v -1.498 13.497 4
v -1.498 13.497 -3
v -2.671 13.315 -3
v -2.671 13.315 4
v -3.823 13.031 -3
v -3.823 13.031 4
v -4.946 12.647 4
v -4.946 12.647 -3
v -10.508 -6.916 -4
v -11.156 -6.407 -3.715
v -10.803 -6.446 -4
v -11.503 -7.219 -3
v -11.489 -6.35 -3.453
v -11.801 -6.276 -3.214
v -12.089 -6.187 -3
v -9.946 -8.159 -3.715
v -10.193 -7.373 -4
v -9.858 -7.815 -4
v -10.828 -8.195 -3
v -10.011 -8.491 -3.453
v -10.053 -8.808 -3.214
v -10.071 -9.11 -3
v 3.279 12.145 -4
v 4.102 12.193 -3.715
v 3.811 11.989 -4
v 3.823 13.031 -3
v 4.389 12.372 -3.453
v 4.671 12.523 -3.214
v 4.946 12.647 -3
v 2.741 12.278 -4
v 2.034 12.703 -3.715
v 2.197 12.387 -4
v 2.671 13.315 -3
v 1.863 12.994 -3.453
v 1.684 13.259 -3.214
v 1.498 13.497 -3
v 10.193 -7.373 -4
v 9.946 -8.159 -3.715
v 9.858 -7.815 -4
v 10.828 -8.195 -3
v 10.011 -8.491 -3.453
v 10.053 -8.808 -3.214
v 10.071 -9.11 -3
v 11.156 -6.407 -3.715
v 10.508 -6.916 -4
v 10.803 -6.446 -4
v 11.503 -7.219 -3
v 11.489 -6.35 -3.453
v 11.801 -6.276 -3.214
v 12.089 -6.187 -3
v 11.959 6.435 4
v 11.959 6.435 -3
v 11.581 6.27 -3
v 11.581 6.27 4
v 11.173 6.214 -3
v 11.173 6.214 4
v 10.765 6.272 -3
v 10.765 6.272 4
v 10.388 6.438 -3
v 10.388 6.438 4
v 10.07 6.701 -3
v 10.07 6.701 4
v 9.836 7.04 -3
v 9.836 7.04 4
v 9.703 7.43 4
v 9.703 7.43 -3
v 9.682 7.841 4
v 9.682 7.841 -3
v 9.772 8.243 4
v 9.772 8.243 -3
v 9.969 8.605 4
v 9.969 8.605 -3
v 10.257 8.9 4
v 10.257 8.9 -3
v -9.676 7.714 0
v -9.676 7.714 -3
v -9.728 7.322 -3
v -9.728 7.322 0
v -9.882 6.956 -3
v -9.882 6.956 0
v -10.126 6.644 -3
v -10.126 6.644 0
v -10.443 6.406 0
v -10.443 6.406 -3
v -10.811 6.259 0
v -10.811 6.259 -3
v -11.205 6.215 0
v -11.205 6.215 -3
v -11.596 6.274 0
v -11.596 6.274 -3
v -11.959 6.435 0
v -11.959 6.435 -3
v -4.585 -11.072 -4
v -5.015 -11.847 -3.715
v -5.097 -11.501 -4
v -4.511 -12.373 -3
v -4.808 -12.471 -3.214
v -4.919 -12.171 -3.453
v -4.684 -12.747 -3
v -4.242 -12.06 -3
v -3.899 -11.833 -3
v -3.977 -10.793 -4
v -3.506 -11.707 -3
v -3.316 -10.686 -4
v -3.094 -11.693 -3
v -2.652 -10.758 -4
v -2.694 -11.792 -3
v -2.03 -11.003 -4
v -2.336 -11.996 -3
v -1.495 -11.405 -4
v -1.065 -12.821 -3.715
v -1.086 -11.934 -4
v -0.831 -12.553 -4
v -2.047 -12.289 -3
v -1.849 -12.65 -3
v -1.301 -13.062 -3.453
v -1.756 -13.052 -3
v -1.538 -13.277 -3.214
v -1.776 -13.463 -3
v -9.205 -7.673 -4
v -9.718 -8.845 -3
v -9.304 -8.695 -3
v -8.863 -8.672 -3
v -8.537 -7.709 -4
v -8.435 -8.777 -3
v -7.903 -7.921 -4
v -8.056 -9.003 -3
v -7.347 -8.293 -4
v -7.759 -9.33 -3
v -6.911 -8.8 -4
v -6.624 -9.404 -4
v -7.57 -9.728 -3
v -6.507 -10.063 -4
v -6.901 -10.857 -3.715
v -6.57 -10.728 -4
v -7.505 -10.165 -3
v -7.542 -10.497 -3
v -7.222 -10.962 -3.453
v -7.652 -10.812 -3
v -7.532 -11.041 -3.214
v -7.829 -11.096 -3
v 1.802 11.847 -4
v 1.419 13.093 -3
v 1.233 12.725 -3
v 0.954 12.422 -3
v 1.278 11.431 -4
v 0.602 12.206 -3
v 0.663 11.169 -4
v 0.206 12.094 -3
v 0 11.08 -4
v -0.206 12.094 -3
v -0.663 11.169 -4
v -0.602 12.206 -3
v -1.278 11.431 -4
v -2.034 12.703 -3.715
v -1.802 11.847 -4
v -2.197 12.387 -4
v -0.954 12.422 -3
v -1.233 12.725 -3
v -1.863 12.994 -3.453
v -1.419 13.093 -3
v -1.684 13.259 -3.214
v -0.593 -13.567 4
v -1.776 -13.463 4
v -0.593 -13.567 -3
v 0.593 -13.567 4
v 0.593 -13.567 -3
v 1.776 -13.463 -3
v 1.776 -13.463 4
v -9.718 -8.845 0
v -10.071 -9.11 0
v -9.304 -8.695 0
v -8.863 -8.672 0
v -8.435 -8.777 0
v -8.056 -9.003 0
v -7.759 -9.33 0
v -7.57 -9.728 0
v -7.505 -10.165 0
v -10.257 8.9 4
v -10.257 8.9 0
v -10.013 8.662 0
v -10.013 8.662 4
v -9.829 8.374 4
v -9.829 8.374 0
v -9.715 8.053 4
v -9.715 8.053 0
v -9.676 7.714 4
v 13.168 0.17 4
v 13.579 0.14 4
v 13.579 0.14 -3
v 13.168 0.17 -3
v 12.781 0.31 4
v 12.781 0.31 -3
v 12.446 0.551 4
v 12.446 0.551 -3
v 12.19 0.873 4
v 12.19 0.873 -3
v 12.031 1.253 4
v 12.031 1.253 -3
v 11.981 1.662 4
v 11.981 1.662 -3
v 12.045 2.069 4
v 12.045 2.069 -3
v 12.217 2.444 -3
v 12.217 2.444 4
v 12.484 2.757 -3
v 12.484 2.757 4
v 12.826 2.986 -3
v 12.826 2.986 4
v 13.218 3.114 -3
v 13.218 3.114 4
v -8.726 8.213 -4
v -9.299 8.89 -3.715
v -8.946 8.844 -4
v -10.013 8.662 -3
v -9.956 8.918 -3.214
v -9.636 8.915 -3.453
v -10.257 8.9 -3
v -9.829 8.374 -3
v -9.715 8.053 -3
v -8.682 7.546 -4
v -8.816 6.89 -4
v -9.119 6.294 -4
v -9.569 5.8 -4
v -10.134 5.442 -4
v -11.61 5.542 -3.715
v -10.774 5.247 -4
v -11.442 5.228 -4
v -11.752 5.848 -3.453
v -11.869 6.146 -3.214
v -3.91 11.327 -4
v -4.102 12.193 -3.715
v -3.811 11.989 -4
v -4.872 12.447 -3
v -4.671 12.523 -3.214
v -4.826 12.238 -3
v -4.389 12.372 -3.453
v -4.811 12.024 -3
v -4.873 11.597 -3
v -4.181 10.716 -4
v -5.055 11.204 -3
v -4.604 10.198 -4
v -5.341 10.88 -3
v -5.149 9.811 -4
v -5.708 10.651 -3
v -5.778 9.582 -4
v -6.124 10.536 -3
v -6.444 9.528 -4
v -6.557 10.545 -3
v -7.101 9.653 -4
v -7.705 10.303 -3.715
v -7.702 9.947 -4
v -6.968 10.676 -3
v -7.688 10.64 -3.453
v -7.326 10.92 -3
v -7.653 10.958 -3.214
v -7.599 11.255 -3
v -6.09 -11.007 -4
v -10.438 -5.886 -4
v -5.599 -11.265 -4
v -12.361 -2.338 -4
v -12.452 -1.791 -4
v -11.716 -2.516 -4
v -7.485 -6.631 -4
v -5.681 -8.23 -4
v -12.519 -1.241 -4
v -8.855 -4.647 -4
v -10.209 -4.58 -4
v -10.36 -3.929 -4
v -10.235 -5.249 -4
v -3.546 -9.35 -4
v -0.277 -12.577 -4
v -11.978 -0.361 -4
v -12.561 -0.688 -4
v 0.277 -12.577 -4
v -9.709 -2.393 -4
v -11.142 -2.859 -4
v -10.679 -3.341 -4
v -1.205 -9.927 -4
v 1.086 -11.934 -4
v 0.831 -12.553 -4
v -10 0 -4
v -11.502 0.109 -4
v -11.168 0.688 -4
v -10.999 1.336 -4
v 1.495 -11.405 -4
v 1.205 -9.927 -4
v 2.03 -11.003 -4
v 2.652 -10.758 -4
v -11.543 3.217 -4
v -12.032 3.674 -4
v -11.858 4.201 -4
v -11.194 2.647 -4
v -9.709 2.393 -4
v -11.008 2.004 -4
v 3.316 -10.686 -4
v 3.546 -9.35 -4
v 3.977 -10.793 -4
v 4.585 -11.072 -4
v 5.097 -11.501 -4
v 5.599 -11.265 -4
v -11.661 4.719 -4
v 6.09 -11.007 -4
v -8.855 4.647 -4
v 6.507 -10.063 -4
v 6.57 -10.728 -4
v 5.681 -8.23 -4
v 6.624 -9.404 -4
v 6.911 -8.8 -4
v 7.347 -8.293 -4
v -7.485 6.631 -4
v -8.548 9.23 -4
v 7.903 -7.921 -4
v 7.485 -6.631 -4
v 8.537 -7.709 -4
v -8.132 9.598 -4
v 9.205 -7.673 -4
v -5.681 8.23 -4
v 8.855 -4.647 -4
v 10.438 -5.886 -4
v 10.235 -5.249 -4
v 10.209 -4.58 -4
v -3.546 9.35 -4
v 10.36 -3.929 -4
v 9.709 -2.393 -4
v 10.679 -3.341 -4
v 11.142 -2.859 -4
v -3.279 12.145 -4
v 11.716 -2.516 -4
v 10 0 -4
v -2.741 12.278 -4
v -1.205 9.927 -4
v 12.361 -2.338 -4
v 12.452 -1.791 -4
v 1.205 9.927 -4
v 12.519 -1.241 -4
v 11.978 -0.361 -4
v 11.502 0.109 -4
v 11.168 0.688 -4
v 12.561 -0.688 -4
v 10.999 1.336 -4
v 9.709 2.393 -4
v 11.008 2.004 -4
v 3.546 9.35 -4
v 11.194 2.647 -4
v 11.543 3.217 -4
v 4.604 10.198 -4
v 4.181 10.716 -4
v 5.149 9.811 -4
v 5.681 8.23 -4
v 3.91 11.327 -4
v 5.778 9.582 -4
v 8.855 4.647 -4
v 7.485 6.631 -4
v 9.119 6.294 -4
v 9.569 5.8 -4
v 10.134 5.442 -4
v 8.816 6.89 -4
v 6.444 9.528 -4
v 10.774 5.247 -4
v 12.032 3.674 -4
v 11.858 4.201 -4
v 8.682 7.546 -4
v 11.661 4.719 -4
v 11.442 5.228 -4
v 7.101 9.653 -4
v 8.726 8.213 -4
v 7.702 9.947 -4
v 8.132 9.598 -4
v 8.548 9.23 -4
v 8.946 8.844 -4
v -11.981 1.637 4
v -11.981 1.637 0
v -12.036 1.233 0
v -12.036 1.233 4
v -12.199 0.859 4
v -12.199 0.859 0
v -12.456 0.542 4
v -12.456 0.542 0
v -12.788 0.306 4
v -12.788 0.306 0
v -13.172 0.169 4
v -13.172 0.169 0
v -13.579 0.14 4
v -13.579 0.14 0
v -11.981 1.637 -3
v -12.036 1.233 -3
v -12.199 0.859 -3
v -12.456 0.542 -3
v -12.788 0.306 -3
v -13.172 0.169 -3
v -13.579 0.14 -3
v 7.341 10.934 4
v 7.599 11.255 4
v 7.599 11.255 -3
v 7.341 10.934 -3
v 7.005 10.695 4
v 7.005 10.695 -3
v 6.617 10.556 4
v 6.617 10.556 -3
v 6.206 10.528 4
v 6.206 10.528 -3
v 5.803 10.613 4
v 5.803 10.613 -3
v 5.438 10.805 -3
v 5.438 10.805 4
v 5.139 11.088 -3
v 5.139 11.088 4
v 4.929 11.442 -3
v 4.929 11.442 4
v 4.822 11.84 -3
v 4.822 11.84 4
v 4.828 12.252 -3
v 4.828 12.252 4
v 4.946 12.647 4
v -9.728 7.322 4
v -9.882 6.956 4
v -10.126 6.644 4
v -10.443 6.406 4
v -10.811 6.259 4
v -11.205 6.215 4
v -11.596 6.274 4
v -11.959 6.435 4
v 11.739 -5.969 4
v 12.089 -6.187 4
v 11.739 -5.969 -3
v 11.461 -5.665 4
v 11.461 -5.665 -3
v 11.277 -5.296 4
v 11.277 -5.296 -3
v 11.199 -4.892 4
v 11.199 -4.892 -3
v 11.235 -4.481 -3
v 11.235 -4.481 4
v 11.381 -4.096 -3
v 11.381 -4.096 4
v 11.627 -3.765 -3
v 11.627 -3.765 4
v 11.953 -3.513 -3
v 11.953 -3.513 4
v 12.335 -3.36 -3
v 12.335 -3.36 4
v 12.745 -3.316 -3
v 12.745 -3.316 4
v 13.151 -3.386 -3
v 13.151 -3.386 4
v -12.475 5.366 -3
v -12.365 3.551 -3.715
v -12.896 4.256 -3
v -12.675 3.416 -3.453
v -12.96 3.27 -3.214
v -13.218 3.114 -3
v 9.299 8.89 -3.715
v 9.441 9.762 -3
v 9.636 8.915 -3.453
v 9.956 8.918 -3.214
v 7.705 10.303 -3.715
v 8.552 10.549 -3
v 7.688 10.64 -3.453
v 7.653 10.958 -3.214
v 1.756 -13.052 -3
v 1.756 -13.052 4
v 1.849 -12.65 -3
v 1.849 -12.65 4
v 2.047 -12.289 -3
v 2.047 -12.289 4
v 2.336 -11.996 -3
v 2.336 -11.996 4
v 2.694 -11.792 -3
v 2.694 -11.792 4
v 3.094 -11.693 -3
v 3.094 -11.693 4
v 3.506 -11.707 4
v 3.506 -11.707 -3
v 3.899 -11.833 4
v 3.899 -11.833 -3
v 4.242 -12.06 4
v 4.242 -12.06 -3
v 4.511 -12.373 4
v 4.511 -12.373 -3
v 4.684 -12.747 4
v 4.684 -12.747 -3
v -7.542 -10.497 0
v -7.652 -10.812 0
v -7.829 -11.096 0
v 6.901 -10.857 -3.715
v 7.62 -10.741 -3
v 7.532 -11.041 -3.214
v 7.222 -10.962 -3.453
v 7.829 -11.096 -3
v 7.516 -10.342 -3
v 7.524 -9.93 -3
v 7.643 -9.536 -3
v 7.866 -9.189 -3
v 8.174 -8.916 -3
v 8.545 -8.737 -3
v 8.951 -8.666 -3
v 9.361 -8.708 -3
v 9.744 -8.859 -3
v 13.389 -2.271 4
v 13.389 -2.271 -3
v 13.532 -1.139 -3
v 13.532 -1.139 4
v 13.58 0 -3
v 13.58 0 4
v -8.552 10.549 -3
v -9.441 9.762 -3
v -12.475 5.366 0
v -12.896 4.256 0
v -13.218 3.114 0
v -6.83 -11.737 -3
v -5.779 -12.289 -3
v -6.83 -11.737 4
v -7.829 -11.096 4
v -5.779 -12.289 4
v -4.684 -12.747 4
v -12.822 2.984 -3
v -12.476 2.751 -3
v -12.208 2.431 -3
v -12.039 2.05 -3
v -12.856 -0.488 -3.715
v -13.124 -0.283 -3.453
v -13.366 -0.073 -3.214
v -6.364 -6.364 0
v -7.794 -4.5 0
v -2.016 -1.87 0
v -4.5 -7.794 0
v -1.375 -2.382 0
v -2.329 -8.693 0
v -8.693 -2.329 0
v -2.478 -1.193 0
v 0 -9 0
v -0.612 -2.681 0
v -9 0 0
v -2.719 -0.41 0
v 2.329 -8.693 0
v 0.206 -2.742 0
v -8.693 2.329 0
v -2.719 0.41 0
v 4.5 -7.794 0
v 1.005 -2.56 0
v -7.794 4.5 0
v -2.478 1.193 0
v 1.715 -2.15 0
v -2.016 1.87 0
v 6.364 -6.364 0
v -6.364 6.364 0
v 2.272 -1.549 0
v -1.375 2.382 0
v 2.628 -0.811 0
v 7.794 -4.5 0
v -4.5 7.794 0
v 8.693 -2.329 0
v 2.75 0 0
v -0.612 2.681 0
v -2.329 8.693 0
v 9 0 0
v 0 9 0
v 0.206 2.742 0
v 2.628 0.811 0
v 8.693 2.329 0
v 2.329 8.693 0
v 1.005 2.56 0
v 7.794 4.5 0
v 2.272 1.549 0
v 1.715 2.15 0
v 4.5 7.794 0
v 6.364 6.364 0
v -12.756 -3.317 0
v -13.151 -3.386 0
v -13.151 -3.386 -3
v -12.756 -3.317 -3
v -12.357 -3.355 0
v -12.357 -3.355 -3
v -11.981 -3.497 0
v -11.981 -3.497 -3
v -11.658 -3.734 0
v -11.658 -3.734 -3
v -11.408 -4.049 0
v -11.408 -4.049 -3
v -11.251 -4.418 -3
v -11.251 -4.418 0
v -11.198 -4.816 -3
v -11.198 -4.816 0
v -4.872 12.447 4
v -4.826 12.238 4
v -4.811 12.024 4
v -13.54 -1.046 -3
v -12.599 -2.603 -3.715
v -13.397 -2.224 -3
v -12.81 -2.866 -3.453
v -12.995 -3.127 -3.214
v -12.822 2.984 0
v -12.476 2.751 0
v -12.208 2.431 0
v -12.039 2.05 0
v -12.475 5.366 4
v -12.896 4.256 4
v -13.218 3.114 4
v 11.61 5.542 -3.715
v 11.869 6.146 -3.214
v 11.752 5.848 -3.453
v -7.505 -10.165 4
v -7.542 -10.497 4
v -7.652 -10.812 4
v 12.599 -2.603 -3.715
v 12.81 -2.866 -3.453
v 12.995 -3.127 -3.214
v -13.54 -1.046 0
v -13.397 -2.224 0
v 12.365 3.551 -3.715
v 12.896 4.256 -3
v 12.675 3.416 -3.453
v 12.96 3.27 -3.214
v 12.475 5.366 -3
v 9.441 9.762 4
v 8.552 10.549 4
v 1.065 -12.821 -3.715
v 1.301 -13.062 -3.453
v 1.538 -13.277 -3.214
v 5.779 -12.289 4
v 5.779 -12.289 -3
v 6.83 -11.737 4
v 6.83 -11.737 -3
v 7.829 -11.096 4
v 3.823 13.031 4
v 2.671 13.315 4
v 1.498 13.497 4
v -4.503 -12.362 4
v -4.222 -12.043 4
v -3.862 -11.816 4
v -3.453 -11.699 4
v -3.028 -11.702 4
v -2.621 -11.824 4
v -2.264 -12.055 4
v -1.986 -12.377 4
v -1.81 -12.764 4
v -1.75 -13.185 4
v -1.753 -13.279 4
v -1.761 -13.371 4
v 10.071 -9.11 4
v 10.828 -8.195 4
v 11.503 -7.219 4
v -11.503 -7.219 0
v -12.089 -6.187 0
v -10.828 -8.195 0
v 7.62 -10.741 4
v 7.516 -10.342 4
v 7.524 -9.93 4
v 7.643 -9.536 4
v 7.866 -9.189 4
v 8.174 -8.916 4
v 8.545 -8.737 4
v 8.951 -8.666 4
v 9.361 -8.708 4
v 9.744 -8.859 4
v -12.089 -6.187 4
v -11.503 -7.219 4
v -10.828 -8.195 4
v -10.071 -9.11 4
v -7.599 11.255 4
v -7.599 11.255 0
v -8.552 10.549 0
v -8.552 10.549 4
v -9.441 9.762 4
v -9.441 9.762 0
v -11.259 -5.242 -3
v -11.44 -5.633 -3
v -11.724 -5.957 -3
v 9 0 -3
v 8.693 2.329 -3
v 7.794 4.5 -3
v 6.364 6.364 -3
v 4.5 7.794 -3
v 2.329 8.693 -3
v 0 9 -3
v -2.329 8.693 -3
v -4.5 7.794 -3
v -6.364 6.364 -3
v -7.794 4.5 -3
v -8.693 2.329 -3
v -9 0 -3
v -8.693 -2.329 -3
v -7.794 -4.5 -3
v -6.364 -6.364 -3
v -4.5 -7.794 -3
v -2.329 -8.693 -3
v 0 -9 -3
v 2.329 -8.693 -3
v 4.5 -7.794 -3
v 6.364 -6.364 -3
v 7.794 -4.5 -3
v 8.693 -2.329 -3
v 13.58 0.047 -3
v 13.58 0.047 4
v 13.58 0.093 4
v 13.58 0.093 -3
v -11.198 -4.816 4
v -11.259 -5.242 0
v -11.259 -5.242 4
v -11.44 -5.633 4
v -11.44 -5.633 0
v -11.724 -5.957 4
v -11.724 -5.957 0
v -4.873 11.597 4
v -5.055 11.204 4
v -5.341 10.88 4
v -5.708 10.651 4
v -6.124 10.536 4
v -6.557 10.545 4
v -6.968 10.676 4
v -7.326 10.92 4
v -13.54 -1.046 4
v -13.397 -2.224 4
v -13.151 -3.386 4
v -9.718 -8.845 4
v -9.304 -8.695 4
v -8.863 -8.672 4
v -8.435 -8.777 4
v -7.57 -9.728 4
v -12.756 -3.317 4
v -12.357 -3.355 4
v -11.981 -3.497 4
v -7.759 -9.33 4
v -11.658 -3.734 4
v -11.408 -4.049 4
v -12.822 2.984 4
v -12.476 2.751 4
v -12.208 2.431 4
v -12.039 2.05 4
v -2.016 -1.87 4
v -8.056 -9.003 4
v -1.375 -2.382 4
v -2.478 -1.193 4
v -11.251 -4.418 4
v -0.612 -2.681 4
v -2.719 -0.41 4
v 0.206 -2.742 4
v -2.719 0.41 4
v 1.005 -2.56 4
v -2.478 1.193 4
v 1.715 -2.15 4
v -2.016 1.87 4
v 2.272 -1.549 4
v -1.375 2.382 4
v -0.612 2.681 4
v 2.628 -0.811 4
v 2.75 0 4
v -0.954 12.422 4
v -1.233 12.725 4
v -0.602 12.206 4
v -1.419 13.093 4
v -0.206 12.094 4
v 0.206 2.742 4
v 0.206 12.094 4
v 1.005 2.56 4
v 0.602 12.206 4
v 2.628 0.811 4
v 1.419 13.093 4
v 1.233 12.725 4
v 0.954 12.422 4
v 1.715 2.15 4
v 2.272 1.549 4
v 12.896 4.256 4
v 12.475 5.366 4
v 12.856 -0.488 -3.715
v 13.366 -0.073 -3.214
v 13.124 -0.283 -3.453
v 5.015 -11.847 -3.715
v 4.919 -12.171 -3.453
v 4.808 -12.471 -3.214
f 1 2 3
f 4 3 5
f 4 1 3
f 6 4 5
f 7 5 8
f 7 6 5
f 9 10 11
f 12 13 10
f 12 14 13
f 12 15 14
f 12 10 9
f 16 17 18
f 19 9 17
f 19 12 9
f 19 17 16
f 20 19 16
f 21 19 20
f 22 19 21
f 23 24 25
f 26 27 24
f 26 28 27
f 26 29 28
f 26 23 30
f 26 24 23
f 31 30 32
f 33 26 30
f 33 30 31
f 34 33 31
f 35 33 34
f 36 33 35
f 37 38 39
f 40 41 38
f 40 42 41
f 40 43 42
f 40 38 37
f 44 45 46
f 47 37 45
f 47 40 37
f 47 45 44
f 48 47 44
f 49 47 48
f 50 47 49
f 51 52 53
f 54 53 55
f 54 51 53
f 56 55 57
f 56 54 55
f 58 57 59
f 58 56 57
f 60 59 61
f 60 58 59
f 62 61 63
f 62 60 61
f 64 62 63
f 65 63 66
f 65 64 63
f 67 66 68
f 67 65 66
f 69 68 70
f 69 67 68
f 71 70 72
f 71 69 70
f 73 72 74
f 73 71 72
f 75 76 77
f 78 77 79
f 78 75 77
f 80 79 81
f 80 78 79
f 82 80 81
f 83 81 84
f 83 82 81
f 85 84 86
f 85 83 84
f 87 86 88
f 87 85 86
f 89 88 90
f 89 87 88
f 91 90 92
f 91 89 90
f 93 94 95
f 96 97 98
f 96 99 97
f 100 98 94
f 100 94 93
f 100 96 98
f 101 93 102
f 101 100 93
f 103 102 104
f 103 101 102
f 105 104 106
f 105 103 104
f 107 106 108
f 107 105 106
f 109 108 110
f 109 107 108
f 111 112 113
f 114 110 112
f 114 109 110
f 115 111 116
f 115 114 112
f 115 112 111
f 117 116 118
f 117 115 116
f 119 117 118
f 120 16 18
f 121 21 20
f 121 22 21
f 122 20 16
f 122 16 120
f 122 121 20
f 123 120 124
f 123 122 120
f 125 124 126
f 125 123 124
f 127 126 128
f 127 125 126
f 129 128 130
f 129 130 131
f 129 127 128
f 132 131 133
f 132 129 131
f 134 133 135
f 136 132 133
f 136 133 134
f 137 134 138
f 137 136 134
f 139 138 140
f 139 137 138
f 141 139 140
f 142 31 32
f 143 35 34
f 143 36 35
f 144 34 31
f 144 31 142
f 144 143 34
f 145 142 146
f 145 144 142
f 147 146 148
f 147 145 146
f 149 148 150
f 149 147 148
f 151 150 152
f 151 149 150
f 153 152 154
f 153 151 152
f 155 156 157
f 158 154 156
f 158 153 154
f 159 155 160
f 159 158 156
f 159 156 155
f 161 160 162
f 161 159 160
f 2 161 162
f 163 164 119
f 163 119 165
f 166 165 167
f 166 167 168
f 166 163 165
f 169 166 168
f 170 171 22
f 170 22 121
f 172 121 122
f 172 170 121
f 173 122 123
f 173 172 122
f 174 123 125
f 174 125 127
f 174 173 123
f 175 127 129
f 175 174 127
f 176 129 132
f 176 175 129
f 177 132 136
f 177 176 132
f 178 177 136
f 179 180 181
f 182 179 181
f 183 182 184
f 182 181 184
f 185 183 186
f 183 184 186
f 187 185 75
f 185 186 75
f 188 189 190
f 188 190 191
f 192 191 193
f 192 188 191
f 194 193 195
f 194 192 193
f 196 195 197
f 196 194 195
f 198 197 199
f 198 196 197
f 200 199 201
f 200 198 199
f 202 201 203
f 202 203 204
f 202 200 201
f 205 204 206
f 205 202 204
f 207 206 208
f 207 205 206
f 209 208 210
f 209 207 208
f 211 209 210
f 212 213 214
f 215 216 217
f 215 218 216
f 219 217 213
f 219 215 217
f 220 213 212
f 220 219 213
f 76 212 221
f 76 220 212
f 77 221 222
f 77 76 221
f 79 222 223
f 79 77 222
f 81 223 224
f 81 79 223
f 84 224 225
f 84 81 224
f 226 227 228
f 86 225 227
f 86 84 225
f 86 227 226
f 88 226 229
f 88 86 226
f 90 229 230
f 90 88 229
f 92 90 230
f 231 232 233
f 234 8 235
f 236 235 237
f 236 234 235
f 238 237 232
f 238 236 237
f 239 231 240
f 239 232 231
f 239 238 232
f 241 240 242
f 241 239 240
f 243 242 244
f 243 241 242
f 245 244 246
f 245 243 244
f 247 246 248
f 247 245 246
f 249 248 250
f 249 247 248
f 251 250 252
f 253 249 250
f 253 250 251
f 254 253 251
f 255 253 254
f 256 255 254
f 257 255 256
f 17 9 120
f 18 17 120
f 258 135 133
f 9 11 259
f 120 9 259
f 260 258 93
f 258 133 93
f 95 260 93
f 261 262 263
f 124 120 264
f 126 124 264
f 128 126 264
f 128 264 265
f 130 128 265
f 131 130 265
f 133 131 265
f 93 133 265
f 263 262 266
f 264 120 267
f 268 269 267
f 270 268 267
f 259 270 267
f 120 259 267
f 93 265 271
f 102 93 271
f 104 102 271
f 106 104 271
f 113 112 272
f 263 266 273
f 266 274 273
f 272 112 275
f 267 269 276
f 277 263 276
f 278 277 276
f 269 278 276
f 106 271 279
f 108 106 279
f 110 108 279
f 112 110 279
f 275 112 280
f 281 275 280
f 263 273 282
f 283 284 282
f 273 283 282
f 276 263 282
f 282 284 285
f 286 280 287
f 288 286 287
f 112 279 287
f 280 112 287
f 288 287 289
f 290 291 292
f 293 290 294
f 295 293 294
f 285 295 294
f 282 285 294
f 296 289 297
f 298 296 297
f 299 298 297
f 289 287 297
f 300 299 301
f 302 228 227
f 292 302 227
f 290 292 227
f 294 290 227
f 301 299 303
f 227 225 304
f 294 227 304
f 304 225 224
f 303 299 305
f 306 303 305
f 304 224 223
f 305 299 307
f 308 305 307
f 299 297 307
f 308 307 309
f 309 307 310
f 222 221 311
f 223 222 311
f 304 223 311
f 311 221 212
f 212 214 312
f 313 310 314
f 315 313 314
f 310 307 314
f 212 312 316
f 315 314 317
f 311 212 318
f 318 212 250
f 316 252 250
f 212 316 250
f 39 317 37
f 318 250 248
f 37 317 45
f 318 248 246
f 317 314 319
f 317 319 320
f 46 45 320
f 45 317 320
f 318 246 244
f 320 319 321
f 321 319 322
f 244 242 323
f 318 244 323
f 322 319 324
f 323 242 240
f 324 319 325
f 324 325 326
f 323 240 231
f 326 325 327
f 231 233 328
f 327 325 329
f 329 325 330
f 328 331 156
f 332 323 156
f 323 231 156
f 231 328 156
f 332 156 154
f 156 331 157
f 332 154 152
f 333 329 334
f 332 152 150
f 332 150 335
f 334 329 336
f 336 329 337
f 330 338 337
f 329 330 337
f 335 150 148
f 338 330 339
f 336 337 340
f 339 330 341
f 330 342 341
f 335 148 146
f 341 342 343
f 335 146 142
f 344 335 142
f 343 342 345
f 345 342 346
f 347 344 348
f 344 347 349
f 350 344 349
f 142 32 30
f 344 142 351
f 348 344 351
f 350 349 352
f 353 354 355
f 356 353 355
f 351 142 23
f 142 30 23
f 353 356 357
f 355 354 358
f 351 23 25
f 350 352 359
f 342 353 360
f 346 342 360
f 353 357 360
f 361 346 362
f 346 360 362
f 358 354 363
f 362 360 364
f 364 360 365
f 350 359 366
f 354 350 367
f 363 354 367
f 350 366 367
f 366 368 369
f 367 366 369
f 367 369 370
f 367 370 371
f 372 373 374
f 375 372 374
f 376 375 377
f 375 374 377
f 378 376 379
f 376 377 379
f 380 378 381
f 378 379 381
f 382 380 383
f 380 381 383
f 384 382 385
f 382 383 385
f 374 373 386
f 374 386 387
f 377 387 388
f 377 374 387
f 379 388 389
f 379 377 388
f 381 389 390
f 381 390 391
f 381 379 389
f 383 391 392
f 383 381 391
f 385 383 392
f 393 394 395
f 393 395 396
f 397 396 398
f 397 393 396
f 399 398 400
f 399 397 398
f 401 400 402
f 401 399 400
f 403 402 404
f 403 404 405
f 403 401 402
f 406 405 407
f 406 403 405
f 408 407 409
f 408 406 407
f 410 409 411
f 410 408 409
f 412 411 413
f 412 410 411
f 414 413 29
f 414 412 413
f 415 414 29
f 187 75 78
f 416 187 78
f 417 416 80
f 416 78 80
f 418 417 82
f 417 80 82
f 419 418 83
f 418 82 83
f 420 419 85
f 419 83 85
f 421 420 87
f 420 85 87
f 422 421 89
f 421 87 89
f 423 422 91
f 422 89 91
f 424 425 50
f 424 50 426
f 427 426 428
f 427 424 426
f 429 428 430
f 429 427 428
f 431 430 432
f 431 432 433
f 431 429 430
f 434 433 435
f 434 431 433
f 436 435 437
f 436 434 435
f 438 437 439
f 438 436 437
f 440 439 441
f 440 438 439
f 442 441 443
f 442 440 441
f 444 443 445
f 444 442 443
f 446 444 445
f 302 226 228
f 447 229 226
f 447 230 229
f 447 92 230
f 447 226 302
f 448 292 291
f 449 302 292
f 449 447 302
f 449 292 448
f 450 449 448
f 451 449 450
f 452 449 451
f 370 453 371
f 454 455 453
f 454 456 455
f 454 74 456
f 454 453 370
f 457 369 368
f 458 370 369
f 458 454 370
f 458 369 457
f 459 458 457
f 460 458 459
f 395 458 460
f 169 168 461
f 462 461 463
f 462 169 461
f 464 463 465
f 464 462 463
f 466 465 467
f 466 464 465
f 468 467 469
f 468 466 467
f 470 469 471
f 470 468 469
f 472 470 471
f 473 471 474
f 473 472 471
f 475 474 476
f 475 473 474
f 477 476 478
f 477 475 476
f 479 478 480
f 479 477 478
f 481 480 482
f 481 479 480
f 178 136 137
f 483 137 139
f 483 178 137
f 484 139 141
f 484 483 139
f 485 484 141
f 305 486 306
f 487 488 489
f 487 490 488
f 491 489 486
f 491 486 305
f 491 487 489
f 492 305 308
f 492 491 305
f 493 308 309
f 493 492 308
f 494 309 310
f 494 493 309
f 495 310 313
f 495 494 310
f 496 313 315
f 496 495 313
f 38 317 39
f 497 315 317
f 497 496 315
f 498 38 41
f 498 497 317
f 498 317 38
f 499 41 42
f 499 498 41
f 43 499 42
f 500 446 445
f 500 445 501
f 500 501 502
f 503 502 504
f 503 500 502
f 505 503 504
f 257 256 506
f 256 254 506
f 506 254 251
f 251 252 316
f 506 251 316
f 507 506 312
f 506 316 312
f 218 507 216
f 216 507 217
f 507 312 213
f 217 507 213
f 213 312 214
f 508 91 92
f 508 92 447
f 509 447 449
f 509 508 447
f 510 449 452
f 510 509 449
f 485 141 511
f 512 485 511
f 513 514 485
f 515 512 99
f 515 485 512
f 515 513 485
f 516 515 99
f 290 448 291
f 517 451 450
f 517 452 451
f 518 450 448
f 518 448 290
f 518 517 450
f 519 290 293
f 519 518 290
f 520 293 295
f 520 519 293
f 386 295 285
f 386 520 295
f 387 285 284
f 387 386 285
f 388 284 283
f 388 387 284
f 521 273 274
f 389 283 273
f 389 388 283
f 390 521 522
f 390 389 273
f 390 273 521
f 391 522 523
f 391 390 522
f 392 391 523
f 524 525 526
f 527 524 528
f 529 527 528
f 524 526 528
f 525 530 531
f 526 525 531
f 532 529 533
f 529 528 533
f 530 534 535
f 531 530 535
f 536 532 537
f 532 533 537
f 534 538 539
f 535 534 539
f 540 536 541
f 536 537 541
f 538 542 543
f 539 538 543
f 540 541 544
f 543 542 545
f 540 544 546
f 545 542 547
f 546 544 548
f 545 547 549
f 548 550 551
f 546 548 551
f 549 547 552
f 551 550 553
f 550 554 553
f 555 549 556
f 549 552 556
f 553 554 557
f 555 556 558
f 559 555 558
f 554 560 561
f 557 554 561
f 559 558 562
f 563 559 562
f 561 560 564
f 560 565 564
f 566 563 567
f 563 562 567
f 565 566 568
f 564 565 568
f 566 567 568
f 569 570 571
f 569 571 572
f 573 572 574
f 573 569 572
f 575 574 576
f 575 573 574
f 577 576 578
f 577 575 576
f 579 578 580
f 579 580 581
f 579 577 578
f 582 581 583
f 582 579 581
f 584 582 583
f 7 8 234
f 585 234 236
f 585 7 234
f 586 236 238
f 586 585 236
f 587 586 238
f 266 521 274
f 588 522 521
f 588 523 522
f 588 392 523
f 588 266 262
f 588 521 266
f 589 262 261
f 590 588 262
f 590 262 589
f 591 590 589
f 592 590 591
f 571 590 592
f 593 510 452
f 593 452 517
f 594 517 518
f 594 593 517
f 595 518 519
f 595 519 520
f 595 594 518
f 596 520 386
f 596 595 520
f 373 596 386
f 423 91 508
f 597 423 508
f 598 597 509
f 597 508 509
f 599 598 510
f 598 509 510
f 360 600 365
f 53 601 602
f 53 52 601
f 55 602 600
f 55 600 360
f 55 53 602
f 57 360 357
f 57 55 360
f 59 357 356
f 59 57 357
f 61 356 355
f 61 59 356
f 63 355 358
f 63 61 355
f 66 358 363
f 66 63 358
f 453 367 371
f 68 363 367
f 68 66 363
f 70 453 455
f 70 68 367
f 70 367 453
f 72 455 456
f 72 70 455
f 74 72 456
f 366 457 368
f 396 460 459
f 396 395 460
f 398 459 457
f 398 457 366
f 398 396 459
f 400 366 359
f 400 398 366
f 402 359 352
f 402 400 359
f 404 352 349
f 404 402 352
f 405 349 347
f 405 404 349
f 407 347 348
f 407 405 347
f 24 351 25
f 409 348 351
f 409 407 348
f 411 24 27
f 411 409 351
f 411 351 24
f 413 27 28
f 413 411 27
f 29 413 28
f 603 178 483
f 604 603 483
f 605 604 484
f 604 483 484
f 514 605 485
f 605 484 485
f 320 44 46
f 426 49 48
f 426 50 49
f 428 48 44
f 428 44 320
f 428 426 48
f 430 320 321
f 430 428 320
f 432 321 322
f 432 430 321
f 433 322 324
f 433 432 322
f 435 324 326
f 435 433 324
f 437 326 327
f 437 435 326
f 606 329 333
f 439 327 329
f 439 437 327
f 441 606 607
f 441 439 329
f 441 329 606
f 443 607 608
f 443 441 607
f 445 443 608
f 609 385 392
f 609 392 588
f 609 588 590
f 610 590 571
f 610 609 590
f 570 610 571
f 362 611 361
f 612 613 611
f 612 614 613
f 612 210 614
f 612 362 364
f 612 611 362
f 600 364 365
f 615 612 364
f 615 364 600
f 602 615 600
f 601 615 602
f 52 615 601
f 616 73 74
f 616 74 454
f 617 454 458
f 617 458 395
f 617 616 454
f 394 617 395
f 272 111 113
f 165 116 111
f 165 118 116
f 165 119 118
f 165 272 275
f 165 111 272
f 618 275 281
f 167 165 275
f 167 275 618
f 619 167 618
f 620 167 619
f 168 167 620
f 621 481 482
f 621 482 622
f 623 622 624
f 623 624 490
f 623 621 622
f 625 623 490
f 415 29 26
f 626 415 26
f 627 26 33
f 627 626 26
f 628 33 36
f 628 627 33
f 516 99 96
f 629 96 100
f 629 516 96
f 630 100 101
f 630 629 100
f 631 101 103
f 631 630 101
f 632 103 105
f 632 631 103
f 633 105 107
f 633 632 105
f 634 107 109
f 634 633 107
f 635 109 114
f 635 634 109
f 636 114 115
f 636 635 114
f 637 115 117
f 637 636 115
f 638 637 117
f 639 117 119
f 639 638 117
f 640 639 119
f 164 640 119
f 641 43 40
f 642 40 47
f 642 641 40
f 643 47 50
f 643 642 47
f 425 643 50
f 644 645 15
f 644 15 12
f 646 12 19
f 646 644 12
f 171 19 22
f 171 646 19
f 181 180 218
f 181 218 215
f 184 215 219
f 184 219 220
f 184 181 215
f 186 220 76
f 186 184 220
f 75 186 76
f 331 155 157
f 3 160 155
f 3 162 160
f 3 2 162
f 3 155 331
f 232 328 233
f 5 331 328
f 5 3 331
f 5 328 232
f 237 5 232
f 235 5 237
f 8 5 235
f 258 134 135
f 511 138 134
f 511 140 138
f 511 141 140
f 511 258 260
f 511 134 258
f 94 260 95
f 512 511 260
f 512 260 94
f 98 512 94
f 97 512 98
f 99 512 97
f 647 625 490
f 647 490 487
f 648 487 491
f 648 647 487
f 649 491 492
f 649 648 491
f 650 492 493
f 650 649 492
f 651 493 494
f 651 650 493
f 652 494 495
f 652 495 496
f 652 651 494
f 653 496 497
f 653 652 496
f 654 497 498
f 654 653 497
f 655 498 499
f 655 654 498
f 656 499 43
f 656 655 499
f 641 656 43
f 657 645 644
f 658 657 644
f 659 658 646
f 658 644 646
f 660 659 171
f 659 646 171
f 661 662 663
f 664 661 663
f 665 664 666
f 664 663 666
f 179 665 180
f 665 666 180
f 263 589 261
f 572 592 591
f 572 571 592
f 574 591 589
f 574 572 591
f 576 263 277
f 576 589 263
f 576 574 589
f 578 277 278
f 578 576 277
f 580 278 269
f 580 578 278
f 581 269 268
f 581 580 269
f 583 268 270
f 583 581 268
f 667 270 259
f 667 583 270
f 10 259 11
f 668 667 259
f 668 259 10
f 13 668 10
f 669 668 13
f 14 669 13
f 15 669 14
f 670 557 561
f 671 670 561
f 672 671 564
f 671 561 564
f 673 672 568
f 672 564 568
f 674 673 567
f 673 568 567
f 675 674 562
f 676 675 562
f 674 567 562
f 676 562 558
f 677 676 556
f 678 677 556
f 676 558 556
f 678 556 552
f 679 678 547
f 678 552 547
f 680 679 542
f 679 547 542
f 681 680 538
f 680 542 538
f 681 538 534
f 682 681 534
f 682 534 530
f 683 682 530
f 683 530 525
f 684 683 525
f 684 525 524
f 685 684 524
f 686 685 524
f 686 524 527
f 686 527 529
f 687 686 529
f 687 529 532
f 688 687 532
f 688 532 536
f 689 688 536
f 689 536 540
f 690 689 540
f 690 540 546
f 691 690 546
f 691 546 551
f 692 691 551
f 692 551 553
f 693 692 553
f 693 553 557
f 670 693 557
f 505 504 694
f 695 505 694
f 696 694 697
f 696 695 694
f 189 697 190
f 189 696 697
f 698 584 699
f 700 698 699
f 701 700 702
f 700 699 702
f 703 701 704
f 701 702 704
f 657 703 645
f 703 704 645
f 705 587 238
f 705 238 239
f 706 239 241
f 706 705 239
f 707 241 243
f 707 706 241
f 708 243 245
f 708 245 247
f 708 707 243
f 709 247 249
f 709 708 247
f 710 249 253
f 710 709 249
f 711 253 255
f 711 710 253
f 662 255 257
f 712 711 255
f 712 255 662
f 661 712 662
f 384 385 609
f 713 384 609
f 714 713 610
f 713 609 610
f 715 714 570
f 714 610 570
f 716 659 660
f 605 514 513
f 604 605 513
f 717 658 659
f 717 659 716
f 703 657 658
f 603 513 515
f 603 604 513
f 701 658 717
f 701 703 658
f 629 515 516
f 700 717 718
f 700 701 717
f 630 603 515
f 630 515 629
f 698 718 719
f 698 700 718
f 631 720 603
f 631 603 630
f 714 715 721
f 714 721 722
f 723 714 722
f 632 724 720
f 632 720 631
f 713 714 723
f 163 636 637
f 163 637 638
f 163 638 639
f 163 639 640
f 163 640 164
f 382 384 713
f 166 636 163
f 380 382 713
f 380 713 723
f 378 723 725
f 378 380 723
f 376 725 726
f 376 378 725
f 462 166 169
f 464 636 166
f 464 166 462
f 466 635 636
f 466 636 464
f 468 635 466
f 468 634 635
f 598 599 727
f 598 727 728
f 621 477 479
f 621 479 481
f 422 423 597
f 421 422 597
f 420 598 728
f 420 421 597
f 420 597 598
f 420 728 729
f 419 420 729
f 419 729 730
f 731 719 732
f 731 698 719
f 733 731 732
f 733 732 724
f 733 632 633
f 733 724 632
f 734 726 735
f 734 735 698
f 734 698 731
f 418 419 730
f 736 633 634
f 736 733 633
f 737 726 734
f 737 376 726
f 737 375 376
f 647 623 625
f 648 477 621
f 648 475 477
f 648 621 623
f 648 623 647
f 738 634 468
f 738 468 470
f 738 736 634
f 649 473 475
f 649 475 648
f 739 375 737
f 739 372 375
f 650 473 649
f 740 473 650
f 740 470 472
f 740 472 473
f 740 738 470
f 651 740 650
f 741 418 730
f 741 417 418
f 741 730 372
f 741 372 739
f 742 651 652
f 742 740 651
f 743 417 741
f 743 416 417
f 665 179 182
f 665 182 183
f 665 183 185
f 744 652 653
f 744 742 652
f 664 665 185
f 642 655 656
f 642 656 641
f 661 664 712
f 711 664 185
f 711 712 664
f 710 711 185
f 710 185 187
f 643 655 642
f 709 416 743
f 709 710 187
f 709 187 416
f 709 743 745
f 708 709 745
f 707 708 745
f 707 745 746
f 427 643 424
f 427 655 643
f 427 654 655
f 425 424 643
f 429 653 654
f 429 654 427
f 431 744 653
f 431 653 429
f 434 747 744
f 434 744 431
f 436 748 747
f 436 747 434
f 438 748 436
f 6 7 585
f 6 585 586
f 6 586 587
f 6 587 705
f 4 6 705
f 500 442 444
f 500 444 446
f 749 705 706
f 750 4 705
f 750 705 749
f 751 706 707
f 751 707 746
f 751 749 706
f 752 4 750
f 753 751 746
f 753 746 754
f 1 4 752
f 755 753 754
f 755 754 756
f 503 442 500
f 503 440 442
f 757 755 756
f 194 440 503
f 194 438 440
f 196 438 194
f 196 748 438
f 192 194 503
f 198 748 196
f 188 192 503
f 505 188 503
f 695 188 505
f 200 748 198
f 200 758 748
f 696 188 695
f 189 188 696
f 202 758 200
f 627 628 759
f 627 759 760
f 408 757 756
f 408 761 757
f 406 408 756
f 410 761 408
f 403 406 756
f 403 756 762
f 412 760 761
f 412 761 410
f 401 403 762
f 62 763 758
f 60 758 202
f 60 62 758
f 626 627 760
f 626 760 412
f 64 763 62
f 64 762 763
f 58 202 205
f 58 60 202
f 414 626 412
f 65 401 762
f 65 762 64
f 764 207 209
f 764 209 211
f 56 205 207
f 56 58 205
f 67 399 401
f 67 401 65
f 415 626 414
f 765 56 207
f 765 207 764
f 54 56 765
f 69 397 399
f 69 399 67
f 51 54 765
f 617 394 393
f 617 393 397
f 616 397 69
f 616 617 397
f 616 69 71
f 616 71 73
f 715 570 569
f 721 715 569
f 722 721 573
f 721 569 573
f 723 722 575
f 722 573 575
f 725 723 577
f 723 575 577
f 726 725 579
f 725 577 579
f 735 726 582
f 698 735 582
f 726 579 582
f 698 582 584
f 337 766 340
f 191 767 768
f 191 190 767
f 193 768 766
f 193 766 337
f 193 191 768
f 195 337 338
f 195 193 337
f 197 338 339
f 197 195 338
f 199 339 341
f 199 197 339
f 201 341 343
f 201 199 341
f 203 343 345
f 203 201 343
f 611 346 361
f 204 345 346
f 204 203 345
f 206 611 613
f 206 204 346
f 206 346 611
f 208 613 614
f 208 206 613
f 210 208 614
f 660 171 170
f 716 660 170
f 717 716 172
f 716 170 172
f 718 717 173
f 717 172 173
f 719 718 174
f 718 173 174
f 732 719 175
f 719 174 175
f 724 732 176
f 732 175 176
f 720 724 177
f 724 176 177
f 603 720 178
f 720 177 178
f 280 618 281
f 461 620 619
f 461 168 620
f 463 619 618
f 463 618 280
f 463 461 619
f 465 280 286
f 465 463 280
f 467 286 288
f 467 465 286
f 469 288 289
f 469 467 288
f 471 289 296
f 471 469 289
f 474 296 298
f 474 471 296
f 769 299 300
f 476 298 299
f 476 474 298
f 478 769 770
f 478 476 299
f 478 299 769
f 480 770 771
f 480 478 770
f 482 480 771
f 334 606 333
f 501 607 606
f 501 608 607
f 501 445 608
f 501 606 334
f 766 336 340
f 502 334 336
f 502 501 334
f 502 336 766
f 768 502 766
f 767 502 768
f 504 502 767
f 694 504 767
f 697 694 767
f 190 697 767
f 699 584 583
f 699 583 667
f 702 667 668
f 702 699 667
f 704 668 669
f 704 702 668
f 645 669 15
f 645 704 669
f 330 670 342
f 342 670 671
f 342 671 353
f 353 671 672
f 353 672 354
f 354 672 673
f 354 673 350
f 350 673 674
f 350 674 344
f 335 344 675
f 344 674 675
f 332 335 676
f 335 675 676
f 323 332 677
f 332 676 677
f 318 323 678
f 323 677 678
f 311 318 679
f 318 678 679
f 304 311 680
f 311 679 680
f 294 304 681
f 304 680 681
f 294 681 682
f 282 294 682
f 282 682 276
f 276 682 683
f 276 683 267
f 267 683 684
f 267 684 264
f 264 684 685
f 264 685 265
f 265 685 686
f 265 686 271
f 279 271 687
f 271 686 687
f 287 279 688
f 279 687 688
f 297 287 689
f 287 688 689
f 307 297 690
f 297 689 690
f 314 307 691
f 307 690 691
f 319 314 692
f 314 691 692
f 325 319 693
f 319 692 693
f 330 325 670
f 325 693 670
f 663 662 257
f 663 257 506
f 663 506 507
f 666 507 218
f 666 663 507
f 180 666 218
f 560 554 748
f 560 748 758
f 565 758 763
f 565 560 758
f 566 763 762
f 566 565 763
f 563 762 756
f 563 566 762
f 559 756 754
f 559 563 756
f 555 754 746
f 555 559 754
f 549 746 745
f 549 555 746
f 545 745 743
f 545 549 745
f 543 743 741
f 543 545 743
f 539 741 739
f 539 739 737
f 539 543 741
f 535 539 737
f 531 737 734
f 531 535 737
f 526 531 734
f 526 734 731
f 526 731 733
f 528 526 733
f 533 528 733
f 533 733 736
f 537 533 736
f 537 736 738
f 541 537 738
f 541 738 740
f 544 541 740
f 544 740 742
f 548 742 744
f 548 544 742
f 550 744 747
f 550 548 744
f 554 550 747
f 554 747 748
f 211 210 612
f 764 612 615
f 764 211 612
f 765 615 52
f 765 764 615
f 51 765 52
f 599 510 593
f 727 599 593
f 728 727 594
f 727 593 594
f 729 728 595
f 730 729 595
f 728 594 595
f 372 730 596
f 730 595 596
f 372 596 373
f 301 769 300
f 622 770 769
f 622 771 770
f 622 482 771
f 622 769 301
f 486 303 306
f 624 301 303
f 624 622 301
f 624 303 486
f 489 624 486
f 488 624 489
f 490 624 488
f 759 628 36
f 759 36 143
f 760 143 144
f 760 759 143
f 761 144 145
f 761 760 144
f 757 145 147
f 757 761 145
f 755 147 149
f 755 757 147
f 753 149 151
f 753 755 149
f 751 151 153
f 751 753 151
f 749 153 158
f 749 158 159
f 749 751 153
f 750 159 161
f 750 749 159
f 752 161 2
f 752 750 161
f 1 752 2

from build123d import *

# Parameters (mm, degrees)
F0_R         = 9
F0_R_2       = 2.75
F1_DEPTH     = 4
F2_DEPTH     = 4
F3_T2_ANGLE  = 36.7292460902
F3_T4_ANGLE  = 359.64
F3_T6_ANGLE  = 36.7292460902
F3_T8_ANGLE  = 359.64
F3_T10_ANGLE = 36.7292460902
F3_T12_ANGLE = 359.64
F3_T14_ANGLE = 36.7292460902
F3_T16_ANGLE = 359.64
F3_T18_ANGLE = 36.7292460902
F3_T20_ANGLE = 359.64
F3_T22_ANGLE = 36.7292460902
F3_T24_ANGLE = 359.64
F3_T26_ANGLE = 36.7292460902
F3_T28_ANGLE = 359.64
F3_T30_ANGLE = 36.7292460902
F3_T32_ANGLE = 359.64
F3_T34_ANGLE = 36.7292460902
F3_T36_ANGLE = 359.64
F3_T38_ANGLE = 36.7292460902
F3_T40_ANGLE = 359.64
F3_T42_ANGLE = 36.7292460902
F3_T44_ANGLE = 359.64
F3_T46_ANGLE = 36.7292460902
F3_T48_ANGLE = 359.64
F3_T50_ANGLE = 36.7292460902
F3_T52_ANGLE = 359.64


# Not quite as in the source:
# - a fillet or chamfer that OpenCascade refuses, or shapes differently, is made with other operations: its cross-section is extruded or revolved along the edge and cut away or added


with BuildPart() as f1:
    # F0 (on Top) → F1 (new body)
    with BuildSketch(Plane.XY):
        with BuildLine():
            ThreePointArc((13.1511570809, -3.3857742739), (13.4723626948, -1.7064124416), (13.58, 0))
            ThreePointArc((13.58, 0), (13.579819293, 0.0700568992), (13.5792771769, 0.1401119339))
            ThreePointArc((13.5792771769, 0.1401119339), (11.9919231991, 1.4560830975), (13.218219042, 3.1136932024))
            ThreePointArc((13.218219042, 3.1136932024), (12.6975205757, 4.815534366), (11.9587395379, 6.4346677198))
            ThreePointArc((11.9587395379, 6.4346677198), (9.9416451, 6.8622221405), (10.2571463173, 8.89985109))
            ThreePointArc((10.2571463173, 8.89985109), (9.0052056989, 10.1647759602), (7.5985987892, 11.2551186773))
            ThreePointArc((7.5985987892, 11.2551186773), (5.6138559183, 10.6963087899), (4.9462849834, 12.6471603478))
            ThreePointArc((4.9462849834, 12.6471603478), (3.249906721, 13.1853898806), (1.497710631, 13.4971575847))
            ThreePointArc((1.497710631, 13.4971575847), (0, 12.08), (-1.497710631, 13.4971575847))
            ThreePointArc((-1.497710631, 13.4971575847), (-3.249906721, 13.1853898806), (-4.9462849834, 12.6471603478))
            ThreePointArc((-4.9462849834, 12.6471603478), (-4.845167239, 12.3430963913), (-4.8109406764, 12.0244928284))
            ThreePointArc((-4.8109406764, 12.0244928284), (-5.9118712396, 10.5785524476), (-7.5985987892, 11.2551186773))
            ThreePointArc((-7.5985987892, 11.2551186773), (-9.0052056989, 10.1647759602), (-10.2571463173, 8.89985109))
            ThreePointArc((-10.2571463173, 8.89985109), (-9.8291869969, 8.3744473269), (-9.6761208988, 7.7143192606))
            ThreePointArc((-9.6761208988, 7.7143192606), (-10.4426115119, 6.4058988468), (-11.9587395379, 6.4346677198))
            ThreePointArc((-11.9587395379, 6.4346677198), (-12.6975205757, 4.815534366), (-13.218219042, 3.1136932024))
            ThreePointArc((-13.218219042, 3.1136932024), (-12.3311710463, 2.6001764438), (-11.9809865103, 1.6368881179))
            ThreePointArc((-11.9809865103, 1.6368881179), (-12.4556660725, 0.5420283095), (-13.5792771769, 0.1401119339))
            ThreePointArc((-13.5792771769, 0.1401119339), (-13.4809865103, -1.6368881179), (-13.1511570809, -3.3857742739))
            ThreePointArc((-13.1511570809, -3.3857742739), (-11.811646645, -3.6050685966), (-11.1975205757, -4.815534366))
            ThreePointArc((-11.1975205757, -4.815534366), (-11.4399769841, -5.6332042965), (-12.0889660626, -6.1865418075))
            ThreePointArc((-12.0889660626, -6.1865418075), (-11.1761208988, -7.7143192606), (-10.0713235212, -9.109601667))
            ThreePointArc((-10.0713235212, -9.109601667), (-8.4347570743, -8.7774806179), (-7.5052056989, -10.1647759602))
            ThreePointArc((-7.5052056989, -10.1647759602), (-7.588522816, -10.6577360085), (-7.8292185113, -11.0959333768))
            ThreePointArc((-7.8292185113, -11.0959333768), (-6.3109406764, -12.0244928284), (-4.6842711154, -12.7465291008))
            ThreePointArc((-4.6842711154, -12.7465291008), (-3.0280358031, -11.7018895282), (-1.749906721, -13.1853898806))
            ThreePointArc((-1.749906721, -13.1853898806), (-1.7564170065, -13.3249910007), (-1.7758913513, -13.4633803299))
            ThreePointArc((-1.7758913513, -13.4633803299), (0, -13.58), (1.7758913513, -13.4633803299))
            ThreePointArc((1.7758913513, -13.4633803299), (2.8909332246, -11.7289771545), (4.6842711154, -12.7465291008))
            ThreePointArc((4.6842711154, -12.7465291008), (6.3109406764, -12.0244928284), (7.8292185113, -11.0959333768))
            ThreePointArc((7.8292185113, -11.0959333768), (8.0105217115, -9.0420098379), (10.0713235212, -9.109601667))
            ThreePointArc((10.0713235212, -9.109601667), (11.1761208988, -7.7143192606), (12.0889660626, -6.1865418075))
            ThreePointArc((12.0889660626, -6.1865418075), (11.2949962116, -4.2836270355), (13.1511570809, -3.3857742739))
        make_face()
        Circle(F0_R, mode=Mode.SUBTRACT)
        Circle(F0_R)
        Circle(F0_R_2, mode=Mode.SUBTRACT)
    extrude(amount=F1_DEPTH)

    # F0 (on Top) → F2 (join)
    with BuildSketch(Plane.XY):
        with BuildLine():
            ThreePointArc((13.1511570809, -3.3857742739), (13.4723626948, -1.7064124416), (13.58, 0))
            ThreePointArc((13.58, 0), (13.579819293, 0.0700568992), (13.5792771769, 0.1401119339))
            ThreePointArc((13.5792771769, 0.1401119339), (11.9919231991, 1.4560830975), (13.218219042, 3.1136932024))
            ThreePointArc((13.218219042, 3.1136932024), (12.6975205757, 4.815534366), (11.9587395379, 6.4346677198))
            ThreePointArc((11.9587395379, 6.4346677198), (9.9416451, 6.8622221405), (10.2571463173, 8.89985109))
            ThreePointArc((10.2571463173, 8.89985109), (9.0052056989, 10.1647759602), (7.5985987892, 11.2551186773))
            ThreePointArc((7.5985987892, 11.2551186773), (5.6138559183, 10.6963087899), (4.9462849834, 12.6471603478))
            ThreePointArc((4.9462849834, 12.6471603478), (3.249906721, 13.1853898806), (1.497710631, 13.4971575847))
            ThreePointArc((1.497710631, 13.4971575847), (0, 12.08), (-1.497710631, 13.4971575847))
            ThreePointArc((-1.497710631, 13.4971575847), (-3.249906721, 13.1853898806), (-4.9462849834, 12.6471603478))
            ThreePointArc((-4.9462849834, 12.6471603478), (-4.845167239, 12.3430963913), (-4.8109406764, 12.0244928284))
            ThreePointArc((-4.8109406764, 12.0244928284), (-5.9118712396, 10.5785524476), (-7.5985987892, 11.2551186773))
            ThreePointArc((-7.5985987892, 11.2551186773), (-9.0052056989, 10.1647759602), (-10.2571463173, 8.89985109))
            ThreePointArc((-10.2571463173, 8.89985109), (-9.8291869969, 8.3744473269), (-9.6761208988, 7.7143192606))
            ThreePointArc((-9.6761208988, 7.7143192606), (-10.4426115119, 6.4058988468), (-11.9587395379, 6.4346677198))
            ThreePointArc((-11.9587395379, 6.4346677198), (-12.6975205757, 4.815534366), (-13.218219042, 3.1136932024))
            ThreePointArc((-13.218219042, 3.1136932024), (-12.3311710463, 2.6001764438), (-11.9809865103, 1.6368881179))
            ThreePointArc((-11.9809865103, 1.6368881179), (-12.4556660725, 0.5420283095), (-13.5792771769, 0.1401119339))
            ThreePointArc((-13.5792771769, 0.1401119339), (-13.4809865103, -1.6368881179), (-13.1511570809, -3.3857742739))
            ThreePointArc((-13.1511570809, -3.3857742739), (-11.811646645, -3.6050685966), (-11.1975205757, -4.815534366))
            ThreePointArc((-11.1975205757, -4.815534366), (-11.4399769841, -5.6332042965), (-12.0889660626, -6.1865418075))
            ThreePointArc((-12.0889660626, -6.1865418075), (-11.1761208988, -7.7143192606), (-10.0713235212, -9.109601667))
            ThreePointArc((-10.0713235212, -9.109601667), (-8.4347570743, -8.7774806179), (-7.5052056989, -10.1647759602))
            ThreePointArc((-7.5052056989, -10.1647759602), (-7.588522816, -10.6577360085), (-7.8292185113, -11.0959333768))
            ThreePointArc((-7.8292185113, -11.0959333768), (-6.3109406764, -12.0244928284), (-4.6842711154, -12.7465291008))
            ThreePointArc((-4.6842711154, -12.7465291008), (-3.0280358031, -11.7018895282), (-1.749906721, -13.1853898806))
            ThreePointArc((-1.749906721, -13.1853898806), (-1.7564170065, -13.3249910007), (-1.7758913513, -13.4633803299))
            ThreePointArc((-1.7758913513, -13.4633803299), (0, -13.58), (1.7758913513, -13.4633803299))
            ThreePointArc((1.7758913513, -13.4633803299), (2.8909332246, -11.7289771545), (4.6842711154, -12.7465291008))
            ThreePointArc((4.6842711154, -12.7465291008), (6.3109406764, -12.0244928284), (7.8292185113, -11.0959333768))
            ThreePointArc((7.8292185113, -11.0959333768), (8.0105217115, -9.0420098379), (10.0713235212, -9.109601667))
            ThreePointArc((10.0713235212, -9.109601667), (11.1761208988, -7.7143192606), (12.0889660626, -6.1865418075))
            ThreePointArc((12.0889660626, -6.1865418075), (11.2949962116, -4.2836270355), (13.1511570809, -3.3857742739))
        make_face()
        Circle(F0_R, mode=Mode.SUBTRACT)
    extrude(amount=-F2_DEPTH)

    # F3: chamfer of 1 on 27 edges, made by hand

    # F3_s1 → F3_t2 (revolve, cut)
    with BuildSketch(Plane(origin=(0, 0, 0), x_dir=(0, 0, 1), z_dir=(0.9193151191, 0.3935221873, 0))):
        Polygon((-3, -13.58), (-4, -12.58), (-4, -13.58), align=None)
    revolve(axis=Axis((0, 0, -4), (0, 0, 1)), revolution_arc=F3_T2_ANGLE, mode=Mode.SUBTRACT)

    # F3_s3 → F3_t4 (revolve, cut)
    with BuildSketch(Plane(origin=(-0.0243453928, -0.0350344513, 0), x_dir=(0, 0, 1), z_dir=(-0.5706474193, -0.8211951795, 0))):
        Polygon((-4, 16.0799329854), (-3, 15.0799329854), (-4, 15.0799329854), align=None)
    revolve(axis=Axis((-11.1761208988, 7.7143192606, -4), (0, 0, -1)), revolution_arc=F3_T4_ANGLE, mode=Mode.SUBTRACT)

    # F3_s5 → F3_t6 (revolve, cut)
    with BuildSketch(Plane(origin=(0, 0, 0), x_dir=(0, 0, 1), z_dir=(0.6311342325, 0.7756736302, 0))):
        Polygon((-4, -12.58), (-3, -13.58), (-4, -13.58), align=None)
    revolve(axis=Axis((0, 0, -4), (0, 0, 1)), revolution_arc=F3_T6_ANGLE, mode=Mode.SUBTRACT)

    # F3_s7 → F3_t8 (revolve, cut)
    with BuildSketch(Plane(origin=(-0.0052754534, -0.0423353341, 0), x_dir=(0, 0, 1), z_dir=(-0.1236547672, -0.9923252988, 0))):
        Polygon((-4, 16.0799329854), (-3, 15.0799329854), (-4, 15.0799329854), align=None)
    revolve(axis=Axis((-13.4809865103, 1.6368881179, -4), (0, 0, -1)), revolution_arc=F3_T8_ANGLE, mode=Mode.SUBTRACT)

    # F3_s9 → F3_t10 (revolve, cut)
    with BuildSketch(Plane(origin=(0, 0, 0), x_dir=(0, 0, 1), z_dir=(0.1983680993, 0.9801275923, 0))):
        Polygon((-4, -12.58), (-3, -13.58), (-4, -13.58), align=None)
    revolve(axis=Axis((0, 0, -4), (0, 0, 1)), revolution_arc=F3_T10_ANGLE, mode=Mode.SUBTRACT)

    # F3_s11 → F3_t12 (revolve, cut)
    with BuildSketch(Plane(origin=(0.0150030288, -0.0399377022, 0), x_dir=(0, 0, 1), z_dir=(0.3516657018, -0.9361256508, 0))):
        Polygon((-4, 16.0799329854), (-3, 15.0799329854), (-4, 15.0799329854), align=None)
    revolve(axis=Axis((-12.6975205757, -4.815534366, -4), (0, 0, -1)), revolution_arc=F3_T12_ANGLE, mode=Mode.SUBTRACT)

    # F3_s13 → F3_t14 (revolve, cut)
    with BuildSketch(Plane(origin=(0, 0, 0), x_dir=(0, 0, 1), z_dir=(-0.2798417749, 0.9600461348, 0))):
        Polygon((-4, -12.58), (-3, -13.58), (-4, -13.58), align=None)
    revolve(axis=Axis((0, 0, -4), (0, 0, 1)), revolution_arc=F3_T14_ANGLE, mode=Mode.SUBTRACT)

    # F3_s15 → F3_t16 (revolve, cut)
    with BuildSketch(Plane(origin=(0.0318444978, -0.0283908239, 0), x_dir=(0, 0, 1), z_dir=(0.7464237966, -0.6654708979, 0))):
        Polygon((-4, 16.0799329854), (-3, 15.0799329854), (-4, 15.0799329854), align=None)
    revolve(axis=Axis((-9.0052056989, -10.1647759602, -4), (0, 0, -1)), revolution_arc=F3_T16_ANGLE, mode=Mode.SUBTRACT)

    # F3_s17 → F3_t18 (revolve, cut)
    with BuildSketch(Plane(origin=(0, 0, 0), x_dir=(0, 0, 1), z_dir=(-0.6939432709, 0.7200296777, 0))):
        Polygon((-4, -12.58), (-3, -13.58), (-4, -13.58), align=None)
    revolve(axis=Axis((0, 0, -4), (0, 0, 1)), revolution_arc=F3_T18_ANGLE, mode=Mode.SUBTRACT)

    # F3_s19 → F3_t20 (revolve, cut)
    with BuildSketch(Plane(origin=(0.0413907762, -0.0103399501, 0), x_dir=(0, 0, 1), z_dir=(0.9701851949, -0.242364782, 0))):
        Polygon((-4, 16.0799329854), (-3, 15.0799329854), (-4, 15.0799329854), align=None)
    revolve(axis=Axis((-3.249906721, -13.1853898806, -4), (0, 0, -1)), revolution_arc=F3_T20_ANGLE, mode=Mode.SUBTRACT)

    # F3_s21 → F3_t22 (revolve, cut)
    with BuildSketch(Plane(origin=(0, 0, 0), x_dir=(0, 0, 1), z_dir=(-0.9490707265, 0.3150630987, 0))):
        Polygon((-4, -12.58), (-3, -13.58), (-4, -13.58), align=None)
    revolve(axis=Axis((0, 0, -4), (0, 0, 1)), revolution_arc=F3_T22_ANGLE, mode=Mode.SUBTRACT)

    # F3_s23 → F3_t24 (revolve, cut)
    with BuildSketch(Plane(origin=(0.0414549266, 0.0100796817, 0), x_dir=(0, 0, 1), z_dir=(0.9716888571, 0.2362641846, 0))):
        Polygon((-4, 16.0799329854), (-3, 15.0799329854), (-4, 15.0799329854), align=None)
    revolve(axis=Axis((3.249906721, -13.1853898806, -4), (0, 0, -1)), revolution_arc=F3_T24_ANGLE, mode=Mode.SUBTRACT)

    # F3_s25 → F3_t26 (revolve, cut)
    with BuildSketch(Plane(origin=(0, 0, 0), x_dir=(0, 0, 1), z_dir=(-0.9867775161, -0.1620806393, 0))):
        Polygon((-4, -12.58), (-3, -13.58), (-4, -13.58), align=None)
    revolve(axis=Axis((0, 0, -4), (0, 0, 1)), revolution_arc=F3_T26_ANGLE, mode=Mode.SUBTRACT)

    # F3_s27 → F3_t28 (revolve, cut)
    with BuildSketch(Plane(origin=(0.0320222529, 0.0281901799, 0), x_dir=(0, 0, 1), z_dir=(0.7505903123, 0.6607678739, 0))):
        Polygon((-4, 16.0799329854), (-3, 15.0799329854), (-4, 15.0799329854), align=None)
    revolve(axis=Axis((9.0052056989, -10.1647759602, -4), (0, 0, -1)), revolution_arc=F3_T28_ANGLE, mode=Mode.SUBTRACT)

    # F3_s29 → F3_t30 (revolve, cut)
    with BuildSketch(Plane(origin=(0, 0, 0), x_dir=(0, 0, 1), z_dir=(-0.7984254688, -0.6020936561, 0))):
        Polygon((-4, -12.58), (-3, -13.58), (-4, -13.58), align=None)
    revolve(axis=Axis((0, 0, -4), (0, 0, 1)), revolution_arc=F3_T30_ANGLE, mode=Mode.SUBTRACT)

    # F3_s31 → F3_t32 (revolve, cut)
    with BuildSketch(Plane(origin=(0.0152536669, 0.0398426476, 0), x_dir=(0, 0, 1), z_dir=(0.3575405725, 0.9338976063, 0))):
        Polygon((-4, 16.0799329854), (-3, 15.0799329854), (-4, 15.0799329854), align=None)
    revolve(axis=Axis((12.6975205757, -4.815534366, -4), (0, 0, -1)), revolution_arc=F3_T32_ANGLE, mode=Mode.SUBTRACT)

    # F3_s33 → F3_t34 (revolve, cut)
    with BuildSketch(Plane(origin=(0, 0, 0), x_dir=(0, 0, 1), z_dir=(-0.4271637687, -0.9041742723, 0))):
        Polygon((-4, -12.58), (-3, -13.58), (-4, -13.58), align=None)
    revolve(axis=Axis((0, 0, -4), (0, 0, 1)), revolution_arc=F3_T34_ANGLE, mode=Mode.SUBTRACT)

    # F3_s35 → F3_t36 (revolve, cut)
    with BuildSketch(Plane(origin=(-0.0050093503, 0.0423676449, 0), x_dir=(0, 0, 1), z_dir=(-0.1174174037, 0.9930826518, 0))):
        Polygon((-4, 16.0799329854), (-3, 15.0799329854), (-4, 15.0799329854), align=None)
    revolve(axis=Axis((13.4809865103, 1.6368881179, -4), (0, 0, -1)), revolution_arc=F3_T36_ANGLE, mode=Mode.SUBTRACT)

    # F3_s37 → F3_t38 (revolve, cut)
    with BuildSketch(Plane(origin=(0, 0, 0), x_dir=(0, 0, 1), z_dir=(0.041956003, -0.9991194592, 0))):
        Polygon((-4, -12.58), (-3, -13.58), (-4, -13.58), align=None)
    revolve(axis=Axis((0, 0, -4), (0, 0, 1)), revolution_arc=F3_T38_ANGLE, mode=Mode.SUBTRACT)

    # F3_s39 → F3_t40 (revolve, cut)
    with BuildSketch(Plane(origin=(-0.0241247857, 0.0351867253, 0), x_dir=(0, 0, 1), z_dir=(-0.5654764676, 0.8247644297, 0))):
        Polygon((-4, 16.0799329854), (-3, 15.0799329854), (-4, 15.0799329854), align=None)
    revolve(axis=Axis((11.1761208988, 7.7143192606, -4), (0, 0, -1)), revolution_arc=F3_T40_ANGLE, mode=Mode.SUBTRACT)

    # F3_s41 → F3_t42 (revolve, cut)
    with BuildSketch(Plane(origin=(0, 0, 0), x_dir=(0, 0, 1), z_dir=(0.50146416, -0.8651784187, 0))):
        Polygon((-4, -12.58), (-3, -13.58), (-4, -13.58), align=None)
    revolve(axis=Axis((0, 0, -4), (0, 0, 1)), revolution_arc=F3_T42_ANGLE, mode=Mode.SUBTRACT)

    # F3_s43 → F3_t44 (revolve, cut)
    with BuildSketch(Plane(origin=(-0.0377135235, 0.019944951, 0), x_dir=(0, 0, 1), z_dir=(-0.8839916876, 0.4675026163, 0))):
        Polygon((-4, 16.0799329854), (-3, 15.0799329854), (-4, 15.0799329854), align=None)
    revolve(axis=Axis((6.3109406764, 12.0244928284, -4), (0, 0, -1)), revolution_arc=F3_T44_ANGLE, mode=Mode.SUBTRACT)

    # F3_s45 → F3_t46 (revolve, cut)
    with BuildSketch(Plane(origin=(0, 0, 0), x_dir=(0, 0, 1), z_dir=(0.8460929213, -0.533035429, 0))):
        Polygon((-4, -12.58), (-3, -13.58), (-4, -13.58), align=None)
    revolve(axis=Axis((0, 0, -4), (0, 0, 1)), revolution_arc=F3_T46_ANGLE, mode=Mode.SUBTRACT)

    # F3_s47 → F3_t48 (revolve, cut)
    with BuildSketch(Plane(origin=(-0.0426625475, 0.0001340288, 0), x_dir=(0, 0, 1), z_dir=(-0.9999950652, 0.0031415875, 0))):
        Polygon((-4, 16.0799329854), (-3, 15.0799329854), (-4, 15.0799329854), align=None)
    revolve(axis=Axis((0, 13.58, -4), (0, 0, -1)), revolution_arc=F3_T48_ANGLE, mode=Mode.SUBTRACT)

    # F3_s49 → F3_t50 (revolve, cut)
    with BuildSketch(Plane(origin=(0, 0, 0), x_dir=(0, 0, 1), z_dir=(0.9968919908, -0.0787804463, 0))):
        Polygon((-4, -12.58), (-3, -13.58), (-4, -13.58), align=None)
    revolve(axis=Axis((0, 0, -4), (0, 0, 1)), revolution_arc=F3_T50_ANGLE, mode=Mode.SUBTRACT)

    # F3_s51 → F3_t52 (revolve, cut)
    with BuildSketch(Plane(origin=(-0.0378380961, -0.0197075978, 0), x_dir=(0, 0, 1), z_dir=(-0.8869116246, -0.4619391412, 0))):
        Polygon((-4, 16.0799329854), (-3, 15.0799329854), (-4, 15.0799329854), align=None)
    revolve(axis=Axis((-6.3109406764, 12.0244928284, -4), (0, 0, -1)), revolution_arc=F3_T52_ANGLE, mode=Mode.SUBTRACT)

    # F3_s53 → F3_t54 (revolve, cut)
    with BuildSketch(Plane.XZ):
        Polygon((10, -4), (9, -3), (9, -4), align=None)
    revolve(axis=Axis((0, 0, -4), (0, 0, 1)), mode=Mode.SUBTRACT)


solid = f1.part
